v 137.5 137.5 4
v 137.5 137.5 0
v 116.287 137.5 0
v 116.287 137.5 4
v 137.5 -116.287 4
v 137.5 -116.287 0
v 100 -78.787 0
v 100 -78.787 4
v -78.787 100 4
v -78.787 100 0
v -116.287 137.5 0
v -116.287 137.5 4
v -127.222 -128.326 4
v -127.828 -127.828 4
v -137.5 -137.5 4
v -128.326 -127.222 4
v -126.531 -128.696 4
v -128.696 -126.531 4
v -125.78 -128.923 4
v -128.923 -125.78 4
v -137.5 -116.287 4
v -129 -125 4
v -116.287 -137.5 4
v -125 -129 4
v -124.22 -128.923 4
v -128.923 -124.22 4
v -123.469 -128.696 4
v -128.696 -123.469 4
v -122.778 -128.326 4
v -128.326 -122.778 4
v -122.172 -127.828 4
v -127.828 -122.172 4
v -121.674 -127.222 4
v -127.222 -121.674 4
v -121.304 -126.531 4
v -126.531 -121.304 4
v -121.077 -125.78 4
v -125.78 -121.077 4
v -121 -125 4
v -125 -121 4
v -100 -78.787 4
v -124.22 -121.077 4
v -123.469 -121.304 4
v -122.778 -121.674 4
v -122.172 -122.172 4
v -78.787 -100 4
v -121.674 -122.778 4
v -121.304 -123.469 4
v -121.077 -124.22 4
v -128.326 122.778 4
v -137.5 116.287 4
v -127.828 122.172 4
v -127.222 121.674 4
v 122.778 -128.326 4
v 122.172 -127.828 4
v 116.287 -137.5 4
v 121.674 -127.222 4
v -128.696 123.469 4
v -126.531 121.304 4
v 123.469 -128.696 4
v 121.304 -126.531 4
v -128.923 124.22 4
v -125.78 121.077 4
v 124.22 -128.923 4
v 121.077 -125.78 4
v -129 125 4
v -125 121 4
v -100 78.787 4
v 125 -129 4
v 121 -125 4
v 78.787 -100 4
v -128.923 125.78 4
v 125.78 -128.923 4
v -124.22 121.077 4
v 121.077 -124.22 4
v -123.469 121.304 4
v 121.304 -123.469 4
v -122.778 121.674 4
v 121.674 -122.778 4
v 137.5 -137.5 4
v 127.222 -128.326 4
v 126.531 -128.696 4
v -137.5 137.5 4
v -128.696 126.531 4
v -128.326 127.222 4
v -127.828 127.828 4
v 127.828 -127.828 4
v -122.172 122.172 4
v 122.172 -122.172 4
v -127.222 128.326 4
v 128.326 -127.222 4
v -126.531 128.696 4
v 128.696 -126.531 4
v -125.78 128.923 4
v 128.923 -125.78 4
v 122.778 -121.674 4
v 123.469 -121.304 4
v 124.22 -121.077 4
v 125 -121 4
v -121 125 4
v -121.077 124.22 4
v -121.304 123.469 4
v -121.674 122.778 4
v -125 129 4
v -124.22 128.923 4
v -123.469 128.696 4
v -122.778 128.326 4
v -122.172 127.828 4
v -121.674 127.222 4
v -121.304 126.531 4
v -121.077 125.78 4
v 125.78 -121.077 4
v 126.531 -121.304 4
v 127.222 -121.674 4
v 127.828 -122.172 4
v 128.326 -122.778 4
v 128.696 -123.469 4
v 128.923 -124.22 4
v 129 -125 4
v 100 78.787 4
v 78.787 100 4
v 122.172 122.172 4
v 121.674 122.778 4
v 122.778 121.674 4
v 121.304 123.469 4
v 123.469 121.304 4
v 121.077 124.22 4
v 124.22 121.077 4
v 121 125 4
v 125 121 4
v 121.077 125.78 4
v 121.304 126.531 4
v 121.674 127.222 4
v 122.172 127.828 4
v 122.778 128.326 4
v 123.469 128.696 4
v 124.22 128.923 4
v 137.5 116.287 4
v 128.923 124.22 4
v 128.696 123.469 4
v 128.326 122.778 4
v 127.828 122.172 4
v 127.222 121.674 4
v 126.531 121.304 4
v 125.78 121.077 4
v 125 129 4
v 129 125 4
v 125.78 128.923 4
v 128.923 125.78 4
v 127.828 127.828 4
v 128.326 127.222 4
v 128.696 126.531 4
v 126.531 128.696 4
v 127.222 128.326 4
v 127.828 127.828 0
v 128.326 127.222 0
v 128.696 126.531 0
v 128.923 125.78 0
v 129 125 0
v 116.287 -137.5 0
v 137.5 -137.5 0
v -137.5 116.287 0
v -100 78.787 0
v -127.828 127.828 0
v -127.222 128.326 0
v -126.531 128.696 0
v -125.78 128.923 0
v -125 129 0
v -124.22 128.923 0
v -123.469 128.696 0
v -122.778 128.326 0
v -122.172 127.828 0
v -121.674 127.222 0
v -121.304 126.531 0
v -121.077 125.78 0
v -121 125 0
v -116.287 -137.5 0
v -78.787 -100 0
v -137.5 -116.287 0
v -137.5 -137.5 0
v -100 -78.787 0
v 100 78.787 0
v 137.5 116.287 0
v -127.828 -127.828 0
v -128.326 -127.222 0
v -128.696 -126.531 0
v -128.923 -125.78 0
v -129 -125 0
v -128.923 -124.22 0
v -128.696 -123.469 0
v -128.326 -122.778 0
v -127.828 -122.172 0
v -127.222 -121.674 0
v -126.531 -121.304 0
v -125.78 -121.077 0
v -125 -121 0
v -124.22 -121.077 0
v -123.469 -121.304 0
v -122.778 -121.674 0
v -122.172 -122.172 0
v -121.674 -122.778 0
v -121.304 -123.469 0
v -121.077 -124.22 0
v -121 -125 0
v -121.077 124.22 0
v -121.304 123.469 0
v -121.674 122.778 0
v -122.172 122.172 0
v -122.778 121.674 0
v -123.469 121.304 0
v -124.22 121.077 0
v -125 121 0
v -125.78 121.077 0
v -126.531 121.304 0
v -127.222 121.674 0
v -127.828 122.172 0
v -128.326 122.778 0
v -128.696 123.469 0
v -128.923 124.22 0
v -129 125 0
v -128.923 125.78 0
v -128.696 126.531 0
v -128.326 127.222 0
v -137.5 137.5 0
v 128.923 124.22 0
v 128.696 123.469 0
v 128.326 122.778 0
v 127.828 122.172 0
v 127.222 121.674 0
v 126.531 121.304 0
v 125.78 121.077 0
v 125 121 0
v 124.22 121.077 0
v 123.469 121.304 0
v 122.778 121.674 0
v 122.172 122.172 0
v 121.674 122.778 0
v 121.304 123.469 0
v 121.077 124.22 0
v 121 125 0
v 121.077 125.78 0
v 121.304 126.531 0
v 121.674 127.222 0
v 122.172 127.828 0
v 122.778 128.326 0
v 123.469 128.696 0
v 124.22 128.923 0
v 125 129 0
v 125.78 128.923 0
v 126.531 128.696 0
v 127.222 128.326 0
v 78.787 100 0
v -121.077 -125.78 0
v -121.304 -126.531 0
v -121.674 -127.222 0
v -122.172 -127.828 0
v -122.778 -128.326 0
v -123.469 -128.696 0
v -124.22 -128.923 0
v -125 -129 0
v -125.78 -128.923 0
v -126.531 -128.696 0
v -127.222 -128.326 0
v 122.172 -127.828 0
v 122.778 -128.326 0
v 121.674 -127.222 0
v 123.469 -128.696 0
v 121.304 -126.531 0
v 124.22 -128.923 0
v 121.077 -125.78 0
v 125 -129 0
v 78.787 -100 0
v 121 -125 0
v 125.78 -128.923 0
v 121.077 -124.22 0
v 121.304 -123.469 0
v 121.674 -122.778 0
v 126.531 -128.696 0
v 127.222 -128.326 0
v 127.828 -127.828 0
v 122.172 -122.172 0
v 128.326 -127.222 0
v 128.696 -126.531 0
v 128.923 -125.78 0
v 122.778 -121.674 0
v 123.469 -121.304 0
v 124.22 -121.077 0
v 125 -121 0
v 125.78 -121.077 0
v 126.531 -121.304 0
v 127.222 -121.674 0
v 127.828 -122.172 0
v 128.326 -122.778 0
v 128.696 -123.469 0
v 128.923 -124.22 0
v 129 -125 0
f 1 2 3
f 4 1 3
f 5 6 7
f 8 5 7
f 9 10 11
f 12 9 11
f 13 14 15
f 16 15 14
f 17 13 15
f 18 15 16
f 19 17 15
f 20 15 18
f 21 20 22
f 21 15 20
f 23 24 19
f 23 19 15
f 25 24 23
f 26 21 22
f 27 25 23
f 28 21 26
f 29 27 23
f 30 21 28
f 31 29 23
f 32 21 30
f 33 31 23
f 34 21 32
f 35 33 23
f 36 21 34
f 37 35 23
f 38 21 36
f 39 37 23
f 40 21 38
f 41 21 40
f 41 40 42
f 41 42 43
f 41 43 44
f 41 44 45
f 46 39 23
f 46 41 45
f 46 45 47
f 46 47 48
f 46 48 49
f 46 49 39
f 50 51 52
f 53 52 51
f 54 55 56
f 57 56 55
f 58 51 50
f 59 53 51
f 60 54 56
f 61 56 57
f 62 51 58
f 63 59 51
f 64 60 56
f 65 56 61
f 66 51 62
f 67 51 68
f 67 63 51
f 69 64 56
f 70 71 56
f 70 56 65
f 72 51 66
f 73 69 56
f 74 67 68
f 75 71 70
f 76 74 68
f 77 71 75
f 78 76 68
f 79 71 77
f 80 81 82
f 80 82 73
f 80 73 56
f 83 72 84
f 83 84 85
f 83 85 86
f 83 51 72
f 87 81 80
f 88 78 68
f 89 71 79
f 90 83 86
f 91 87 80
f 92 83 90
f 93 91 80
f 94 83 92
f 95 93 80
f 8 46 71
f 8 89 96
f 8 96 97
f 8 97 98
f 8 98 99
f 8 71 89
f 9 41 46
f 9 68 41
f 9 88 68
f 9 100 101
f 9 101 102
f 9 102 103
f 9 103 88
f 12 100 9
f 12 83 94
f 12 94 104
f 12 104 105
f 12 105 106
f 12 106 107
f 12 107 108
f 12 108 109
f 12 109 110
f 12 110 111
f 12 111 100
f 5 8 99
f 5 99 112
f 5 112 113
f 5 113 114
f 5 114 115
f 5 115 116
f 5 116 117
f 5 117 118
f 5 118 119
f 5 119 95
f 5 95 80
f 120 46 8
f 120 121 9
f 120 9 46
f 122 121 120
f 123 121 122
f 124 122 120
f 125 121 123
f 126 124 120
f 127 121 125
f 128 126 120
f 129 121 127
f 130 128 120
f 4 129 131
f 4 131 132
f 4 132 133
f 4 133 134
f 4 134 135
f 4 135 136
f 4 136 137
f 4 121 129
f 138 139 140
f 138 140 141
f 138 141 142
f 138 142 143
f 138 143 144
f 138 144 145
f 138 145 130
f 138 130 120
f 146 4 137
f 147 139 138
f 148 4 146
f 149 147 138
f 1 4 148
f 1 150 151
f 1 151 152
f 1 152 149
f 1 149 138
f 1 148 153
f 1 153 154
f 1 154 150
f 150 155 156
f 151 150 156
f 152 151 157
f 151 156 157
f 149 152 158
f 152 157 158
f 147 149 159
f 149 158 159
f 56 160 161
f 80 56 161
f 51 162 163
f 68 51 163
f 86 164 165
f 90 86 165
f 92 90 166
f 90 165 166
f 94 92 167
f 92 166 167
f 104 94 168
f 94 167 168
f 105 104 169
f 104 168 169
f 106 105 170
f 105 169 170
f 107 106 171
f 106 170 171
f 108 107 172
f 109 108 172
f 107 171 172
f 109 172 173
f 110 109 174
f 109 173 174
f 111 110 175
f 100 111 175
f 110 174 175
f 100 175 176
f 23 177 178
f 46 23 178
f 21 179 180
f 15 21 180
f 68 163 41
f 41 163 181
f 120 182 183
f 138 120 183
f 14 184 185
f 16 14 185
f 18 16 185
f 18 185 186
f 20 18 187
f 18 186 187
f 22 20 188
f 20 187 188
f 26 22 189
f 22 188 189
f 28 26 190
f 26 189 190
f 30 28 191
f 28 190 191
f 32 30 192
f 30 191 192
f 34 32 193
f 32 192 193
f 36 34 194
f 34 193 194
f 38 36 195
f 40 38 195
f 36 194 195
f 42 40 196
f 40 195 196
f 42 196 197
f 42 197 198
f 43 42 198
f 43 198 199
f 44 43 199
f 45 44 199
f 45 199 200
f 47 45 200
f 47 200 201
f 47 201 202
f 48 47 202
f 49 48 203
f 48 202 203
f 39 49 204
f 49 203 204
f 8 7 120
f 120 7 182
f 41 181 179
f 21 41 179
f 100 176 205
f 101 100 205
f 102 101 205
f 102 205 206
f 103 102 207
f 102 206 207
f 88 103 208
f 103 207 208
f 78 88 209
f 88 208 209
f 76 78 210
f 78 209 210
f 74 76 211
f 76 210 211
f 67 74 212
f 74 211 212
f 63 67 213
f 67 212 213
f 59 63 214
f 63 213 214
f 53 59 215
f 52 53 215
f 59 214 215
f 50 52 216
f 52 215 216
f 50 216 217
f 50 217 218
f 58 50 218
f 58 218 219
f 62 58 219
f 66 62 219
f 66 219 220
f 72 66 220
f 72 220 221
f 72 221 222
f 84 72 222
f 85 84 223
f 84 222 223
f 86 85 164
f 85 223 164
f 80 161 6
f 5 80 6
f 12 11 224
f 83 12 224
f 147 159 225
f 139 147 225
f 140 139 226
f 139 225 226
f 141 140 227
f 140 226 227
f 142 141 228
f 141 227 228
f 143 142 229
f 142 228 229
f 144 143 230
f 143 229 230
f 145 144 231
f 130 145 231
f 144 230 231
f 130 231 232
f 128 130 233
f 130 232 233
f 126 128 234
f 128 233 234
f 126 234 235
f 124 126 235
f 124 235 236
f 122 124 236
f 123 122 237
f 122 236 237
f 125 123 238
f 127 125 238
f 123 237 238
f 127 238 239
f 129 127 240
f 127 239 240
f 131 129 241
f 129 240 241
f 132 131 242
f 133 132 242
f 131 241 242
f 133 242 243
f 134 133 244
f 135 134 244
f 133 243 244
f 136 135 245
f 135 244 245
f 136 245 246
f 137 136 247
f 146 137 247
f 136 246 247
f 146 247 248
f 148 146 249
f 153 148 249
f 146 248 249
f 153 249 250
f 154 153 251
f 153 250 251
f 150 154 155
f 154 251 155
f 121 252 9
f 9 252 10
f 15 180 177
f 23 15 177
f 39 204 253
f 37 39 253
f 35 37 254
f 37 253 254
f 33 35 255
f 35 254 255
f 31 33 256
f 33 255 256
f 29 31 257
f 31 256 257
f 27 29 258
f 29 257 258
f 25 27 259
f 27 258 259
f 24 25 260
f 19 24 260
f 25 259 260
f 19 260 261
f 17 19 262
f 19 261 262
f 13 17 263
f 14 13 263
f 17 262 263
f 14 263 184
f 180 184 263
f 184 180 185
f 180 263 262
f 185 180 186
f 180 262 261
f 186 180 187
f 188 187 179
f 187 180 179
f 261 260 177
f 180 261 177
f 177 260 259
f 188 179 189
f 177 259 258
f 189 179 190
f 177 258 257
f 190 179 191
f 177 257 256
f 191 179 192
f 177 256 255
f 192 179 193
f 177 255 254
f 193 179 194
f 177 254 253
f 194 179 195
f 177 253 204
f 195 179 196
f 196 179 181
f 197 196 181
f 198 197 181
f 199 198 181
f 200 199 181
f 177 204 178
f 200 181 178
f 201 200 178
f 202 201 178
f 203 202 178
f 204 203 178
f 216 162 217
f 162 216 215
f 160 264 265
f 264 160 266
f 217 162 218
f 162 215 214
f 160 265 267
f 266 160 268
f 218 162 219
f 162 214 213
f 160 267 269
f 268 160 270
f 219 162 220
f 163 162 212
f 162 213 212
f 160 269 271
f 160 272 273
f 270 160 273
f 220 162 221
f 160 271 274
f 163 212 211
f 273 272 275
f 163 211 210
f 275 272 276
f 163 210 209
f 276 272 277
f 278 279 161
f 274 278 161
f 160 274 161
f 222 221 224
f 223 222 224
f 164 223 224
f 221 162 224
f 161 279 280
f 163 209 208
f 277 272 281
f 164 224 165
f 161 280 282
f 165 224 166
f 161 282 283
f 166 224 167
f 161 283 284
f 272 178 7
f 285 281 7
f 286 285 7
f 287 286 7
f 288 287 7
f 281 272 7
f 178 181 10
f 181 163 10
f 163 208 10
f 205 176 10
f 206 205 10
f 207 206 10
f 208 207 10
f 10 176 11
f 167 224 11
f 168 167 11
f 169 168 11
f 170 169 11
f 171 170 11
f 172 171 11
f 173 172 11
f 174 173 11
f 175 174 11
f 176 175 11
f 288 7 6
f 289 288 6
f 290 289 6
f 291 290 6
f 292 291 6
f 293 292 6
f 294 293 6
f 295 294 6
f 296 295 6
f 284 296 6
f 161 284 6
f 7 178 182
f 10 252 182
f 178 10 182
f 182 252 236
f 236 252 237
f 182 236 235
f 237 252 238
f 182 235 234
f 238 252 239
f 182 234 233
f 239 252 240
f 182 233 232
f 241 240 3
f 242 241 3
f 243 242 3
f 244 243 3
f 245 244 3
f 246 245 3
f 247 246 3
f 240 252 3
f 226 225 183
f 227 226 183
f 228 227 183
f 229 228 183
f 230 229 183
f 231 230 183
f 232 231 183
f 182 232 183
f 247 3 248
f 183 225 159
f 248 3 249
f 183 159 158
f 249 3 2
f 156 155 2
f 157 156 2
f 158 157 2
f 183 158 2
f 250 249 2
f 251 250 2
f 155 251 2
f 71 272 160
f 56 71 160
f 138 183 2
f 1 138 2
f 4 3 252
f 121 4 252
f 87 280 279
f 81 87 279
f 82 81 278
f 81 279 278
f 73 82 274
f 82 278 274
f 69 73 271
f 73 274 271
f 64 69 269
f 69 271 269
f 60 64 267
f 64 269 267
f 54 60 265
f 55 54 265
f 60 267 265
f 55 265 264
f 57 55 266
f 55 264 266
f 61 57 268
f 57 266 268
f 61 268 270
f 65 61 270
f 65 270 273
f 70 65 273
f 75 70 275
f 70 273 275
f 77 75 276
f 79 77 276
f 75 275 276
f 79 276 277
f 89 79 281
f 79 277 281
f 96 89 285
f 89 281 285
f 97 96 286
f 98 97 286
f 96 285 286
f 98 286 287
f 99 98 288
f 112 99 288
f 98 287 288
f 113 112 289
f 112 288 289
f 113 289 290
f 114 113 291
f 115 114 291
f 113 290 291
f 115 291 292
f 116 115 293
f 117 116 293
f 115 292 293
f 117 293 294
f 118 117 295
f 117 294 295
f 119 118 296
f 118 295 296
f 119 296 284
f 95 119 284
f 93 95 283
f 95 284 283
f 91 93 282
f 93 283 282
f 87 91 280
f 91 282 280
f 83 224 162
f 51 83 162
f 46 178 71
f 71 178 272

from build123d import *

# Parameters (mm, degrees)
F1_DEPTH = 4


with BuildPart() as f1:
    # F0 (on Top) → F1 (new body)
    with BuildSketch(Plane.XY):
        Polygon((116.286797, -137.5), (137.5, -137.5), (137.5, -116.286797), (133.713203, -112.5), (112.5, -112.5), (112.5, -133.713203), align=None)
        with BuildLine():
            ThreePointArc((129, -125), (128.695518, -126.530734), (127.828427, -127.828427))
            ThreePointArc((127.828427, -127.828427), (121.304482, -123.469266), (129, -125))
        make_face(mode=Mode.SUBTRACT)
        Polygon((78.786797, -100), (112.5, -133.713203), (112.5, -112.5), (133.713203, -112.5), (100, -78.786797), (100, -100), align=None)
        Polygon((-78.786797, -100), (78.786797, -100), (100, -100), (100, -78.786797), (100, 78.786797), (100, 100), (78.786797, 100), (-78.786797, 100), (-100, 100), (-100, 78.786797), (-100, -78.786797), (-100, -100), align=None)
        Polygon((-112.5, -133.713203), (-78.786797, -100), (-100, -100), (-100, -78.786797), (-133.713203, -112.5), (-112.5, -112.5), align=None)
        Polygon((100, 100), (100, 78.786797), (133.713203, 112.5), (112.5, 112.5), (112.5, 133.713203), (78.786797, 100), align=None)
        Polygon((-116.286797, -137.5), (-112.5, -133.713203), (-112.5, -112.5), (-133.713203, -112.5), (-137.5, -116.286797), (-137.5, -137.5), align=None)
        with BuildLine():
            ThreePointArc((-121, -125), (-123.469266, -128.695518), (-127.828427, -127.828427))
            ThreePointArc((-127.828427, -127.828427), (-126.530734, -121.304482), (-121, -125))
        make_face(mode=Mode.SUBTRACT)
        Polygon((112.5, 112.5), (133.713203, 112.5), (137.5, 116.286797), (137.5, 137.5), (116.286797, 137.5), (112.5, 133.713203), align=None)
        with BuildLine():
            ThreePointArc((129, 125), (121.304482, 123.469266), (127.828427, 127.828427))
            ThreePointArc((127.828427, 127.828427), (128.695518, 126.530734), (129, 125))
        make_face(mode=Mode.SUBTRACT)
        Polygon((-133.713203, 112.5), (-100, 78.786797), (-100, 100), (-78.786797, 100), (-112.5, 133.713203), (-112.5, 112.5), align=None)
        Polygon((-137.5, 116.286797), (-133.713203, 112.5), (-112.5, 112.5), (-112.5, 133.713203), (-116.286797, 137.5), (-137.5, 137.5), align=None)
        with BuildLine():
            ThreePointArc((-121, 125), (-126.530734, 121.304482), (-127.828427, 127.828427))
            ThreePointArc((-127.828427, 127.828427), (-123.469266, 128.695518), (-121, 125))
        make_face(mode=Mode.SUBTRACT)
    extrude(amount=F1_DEPTH)


solid = f1.part
